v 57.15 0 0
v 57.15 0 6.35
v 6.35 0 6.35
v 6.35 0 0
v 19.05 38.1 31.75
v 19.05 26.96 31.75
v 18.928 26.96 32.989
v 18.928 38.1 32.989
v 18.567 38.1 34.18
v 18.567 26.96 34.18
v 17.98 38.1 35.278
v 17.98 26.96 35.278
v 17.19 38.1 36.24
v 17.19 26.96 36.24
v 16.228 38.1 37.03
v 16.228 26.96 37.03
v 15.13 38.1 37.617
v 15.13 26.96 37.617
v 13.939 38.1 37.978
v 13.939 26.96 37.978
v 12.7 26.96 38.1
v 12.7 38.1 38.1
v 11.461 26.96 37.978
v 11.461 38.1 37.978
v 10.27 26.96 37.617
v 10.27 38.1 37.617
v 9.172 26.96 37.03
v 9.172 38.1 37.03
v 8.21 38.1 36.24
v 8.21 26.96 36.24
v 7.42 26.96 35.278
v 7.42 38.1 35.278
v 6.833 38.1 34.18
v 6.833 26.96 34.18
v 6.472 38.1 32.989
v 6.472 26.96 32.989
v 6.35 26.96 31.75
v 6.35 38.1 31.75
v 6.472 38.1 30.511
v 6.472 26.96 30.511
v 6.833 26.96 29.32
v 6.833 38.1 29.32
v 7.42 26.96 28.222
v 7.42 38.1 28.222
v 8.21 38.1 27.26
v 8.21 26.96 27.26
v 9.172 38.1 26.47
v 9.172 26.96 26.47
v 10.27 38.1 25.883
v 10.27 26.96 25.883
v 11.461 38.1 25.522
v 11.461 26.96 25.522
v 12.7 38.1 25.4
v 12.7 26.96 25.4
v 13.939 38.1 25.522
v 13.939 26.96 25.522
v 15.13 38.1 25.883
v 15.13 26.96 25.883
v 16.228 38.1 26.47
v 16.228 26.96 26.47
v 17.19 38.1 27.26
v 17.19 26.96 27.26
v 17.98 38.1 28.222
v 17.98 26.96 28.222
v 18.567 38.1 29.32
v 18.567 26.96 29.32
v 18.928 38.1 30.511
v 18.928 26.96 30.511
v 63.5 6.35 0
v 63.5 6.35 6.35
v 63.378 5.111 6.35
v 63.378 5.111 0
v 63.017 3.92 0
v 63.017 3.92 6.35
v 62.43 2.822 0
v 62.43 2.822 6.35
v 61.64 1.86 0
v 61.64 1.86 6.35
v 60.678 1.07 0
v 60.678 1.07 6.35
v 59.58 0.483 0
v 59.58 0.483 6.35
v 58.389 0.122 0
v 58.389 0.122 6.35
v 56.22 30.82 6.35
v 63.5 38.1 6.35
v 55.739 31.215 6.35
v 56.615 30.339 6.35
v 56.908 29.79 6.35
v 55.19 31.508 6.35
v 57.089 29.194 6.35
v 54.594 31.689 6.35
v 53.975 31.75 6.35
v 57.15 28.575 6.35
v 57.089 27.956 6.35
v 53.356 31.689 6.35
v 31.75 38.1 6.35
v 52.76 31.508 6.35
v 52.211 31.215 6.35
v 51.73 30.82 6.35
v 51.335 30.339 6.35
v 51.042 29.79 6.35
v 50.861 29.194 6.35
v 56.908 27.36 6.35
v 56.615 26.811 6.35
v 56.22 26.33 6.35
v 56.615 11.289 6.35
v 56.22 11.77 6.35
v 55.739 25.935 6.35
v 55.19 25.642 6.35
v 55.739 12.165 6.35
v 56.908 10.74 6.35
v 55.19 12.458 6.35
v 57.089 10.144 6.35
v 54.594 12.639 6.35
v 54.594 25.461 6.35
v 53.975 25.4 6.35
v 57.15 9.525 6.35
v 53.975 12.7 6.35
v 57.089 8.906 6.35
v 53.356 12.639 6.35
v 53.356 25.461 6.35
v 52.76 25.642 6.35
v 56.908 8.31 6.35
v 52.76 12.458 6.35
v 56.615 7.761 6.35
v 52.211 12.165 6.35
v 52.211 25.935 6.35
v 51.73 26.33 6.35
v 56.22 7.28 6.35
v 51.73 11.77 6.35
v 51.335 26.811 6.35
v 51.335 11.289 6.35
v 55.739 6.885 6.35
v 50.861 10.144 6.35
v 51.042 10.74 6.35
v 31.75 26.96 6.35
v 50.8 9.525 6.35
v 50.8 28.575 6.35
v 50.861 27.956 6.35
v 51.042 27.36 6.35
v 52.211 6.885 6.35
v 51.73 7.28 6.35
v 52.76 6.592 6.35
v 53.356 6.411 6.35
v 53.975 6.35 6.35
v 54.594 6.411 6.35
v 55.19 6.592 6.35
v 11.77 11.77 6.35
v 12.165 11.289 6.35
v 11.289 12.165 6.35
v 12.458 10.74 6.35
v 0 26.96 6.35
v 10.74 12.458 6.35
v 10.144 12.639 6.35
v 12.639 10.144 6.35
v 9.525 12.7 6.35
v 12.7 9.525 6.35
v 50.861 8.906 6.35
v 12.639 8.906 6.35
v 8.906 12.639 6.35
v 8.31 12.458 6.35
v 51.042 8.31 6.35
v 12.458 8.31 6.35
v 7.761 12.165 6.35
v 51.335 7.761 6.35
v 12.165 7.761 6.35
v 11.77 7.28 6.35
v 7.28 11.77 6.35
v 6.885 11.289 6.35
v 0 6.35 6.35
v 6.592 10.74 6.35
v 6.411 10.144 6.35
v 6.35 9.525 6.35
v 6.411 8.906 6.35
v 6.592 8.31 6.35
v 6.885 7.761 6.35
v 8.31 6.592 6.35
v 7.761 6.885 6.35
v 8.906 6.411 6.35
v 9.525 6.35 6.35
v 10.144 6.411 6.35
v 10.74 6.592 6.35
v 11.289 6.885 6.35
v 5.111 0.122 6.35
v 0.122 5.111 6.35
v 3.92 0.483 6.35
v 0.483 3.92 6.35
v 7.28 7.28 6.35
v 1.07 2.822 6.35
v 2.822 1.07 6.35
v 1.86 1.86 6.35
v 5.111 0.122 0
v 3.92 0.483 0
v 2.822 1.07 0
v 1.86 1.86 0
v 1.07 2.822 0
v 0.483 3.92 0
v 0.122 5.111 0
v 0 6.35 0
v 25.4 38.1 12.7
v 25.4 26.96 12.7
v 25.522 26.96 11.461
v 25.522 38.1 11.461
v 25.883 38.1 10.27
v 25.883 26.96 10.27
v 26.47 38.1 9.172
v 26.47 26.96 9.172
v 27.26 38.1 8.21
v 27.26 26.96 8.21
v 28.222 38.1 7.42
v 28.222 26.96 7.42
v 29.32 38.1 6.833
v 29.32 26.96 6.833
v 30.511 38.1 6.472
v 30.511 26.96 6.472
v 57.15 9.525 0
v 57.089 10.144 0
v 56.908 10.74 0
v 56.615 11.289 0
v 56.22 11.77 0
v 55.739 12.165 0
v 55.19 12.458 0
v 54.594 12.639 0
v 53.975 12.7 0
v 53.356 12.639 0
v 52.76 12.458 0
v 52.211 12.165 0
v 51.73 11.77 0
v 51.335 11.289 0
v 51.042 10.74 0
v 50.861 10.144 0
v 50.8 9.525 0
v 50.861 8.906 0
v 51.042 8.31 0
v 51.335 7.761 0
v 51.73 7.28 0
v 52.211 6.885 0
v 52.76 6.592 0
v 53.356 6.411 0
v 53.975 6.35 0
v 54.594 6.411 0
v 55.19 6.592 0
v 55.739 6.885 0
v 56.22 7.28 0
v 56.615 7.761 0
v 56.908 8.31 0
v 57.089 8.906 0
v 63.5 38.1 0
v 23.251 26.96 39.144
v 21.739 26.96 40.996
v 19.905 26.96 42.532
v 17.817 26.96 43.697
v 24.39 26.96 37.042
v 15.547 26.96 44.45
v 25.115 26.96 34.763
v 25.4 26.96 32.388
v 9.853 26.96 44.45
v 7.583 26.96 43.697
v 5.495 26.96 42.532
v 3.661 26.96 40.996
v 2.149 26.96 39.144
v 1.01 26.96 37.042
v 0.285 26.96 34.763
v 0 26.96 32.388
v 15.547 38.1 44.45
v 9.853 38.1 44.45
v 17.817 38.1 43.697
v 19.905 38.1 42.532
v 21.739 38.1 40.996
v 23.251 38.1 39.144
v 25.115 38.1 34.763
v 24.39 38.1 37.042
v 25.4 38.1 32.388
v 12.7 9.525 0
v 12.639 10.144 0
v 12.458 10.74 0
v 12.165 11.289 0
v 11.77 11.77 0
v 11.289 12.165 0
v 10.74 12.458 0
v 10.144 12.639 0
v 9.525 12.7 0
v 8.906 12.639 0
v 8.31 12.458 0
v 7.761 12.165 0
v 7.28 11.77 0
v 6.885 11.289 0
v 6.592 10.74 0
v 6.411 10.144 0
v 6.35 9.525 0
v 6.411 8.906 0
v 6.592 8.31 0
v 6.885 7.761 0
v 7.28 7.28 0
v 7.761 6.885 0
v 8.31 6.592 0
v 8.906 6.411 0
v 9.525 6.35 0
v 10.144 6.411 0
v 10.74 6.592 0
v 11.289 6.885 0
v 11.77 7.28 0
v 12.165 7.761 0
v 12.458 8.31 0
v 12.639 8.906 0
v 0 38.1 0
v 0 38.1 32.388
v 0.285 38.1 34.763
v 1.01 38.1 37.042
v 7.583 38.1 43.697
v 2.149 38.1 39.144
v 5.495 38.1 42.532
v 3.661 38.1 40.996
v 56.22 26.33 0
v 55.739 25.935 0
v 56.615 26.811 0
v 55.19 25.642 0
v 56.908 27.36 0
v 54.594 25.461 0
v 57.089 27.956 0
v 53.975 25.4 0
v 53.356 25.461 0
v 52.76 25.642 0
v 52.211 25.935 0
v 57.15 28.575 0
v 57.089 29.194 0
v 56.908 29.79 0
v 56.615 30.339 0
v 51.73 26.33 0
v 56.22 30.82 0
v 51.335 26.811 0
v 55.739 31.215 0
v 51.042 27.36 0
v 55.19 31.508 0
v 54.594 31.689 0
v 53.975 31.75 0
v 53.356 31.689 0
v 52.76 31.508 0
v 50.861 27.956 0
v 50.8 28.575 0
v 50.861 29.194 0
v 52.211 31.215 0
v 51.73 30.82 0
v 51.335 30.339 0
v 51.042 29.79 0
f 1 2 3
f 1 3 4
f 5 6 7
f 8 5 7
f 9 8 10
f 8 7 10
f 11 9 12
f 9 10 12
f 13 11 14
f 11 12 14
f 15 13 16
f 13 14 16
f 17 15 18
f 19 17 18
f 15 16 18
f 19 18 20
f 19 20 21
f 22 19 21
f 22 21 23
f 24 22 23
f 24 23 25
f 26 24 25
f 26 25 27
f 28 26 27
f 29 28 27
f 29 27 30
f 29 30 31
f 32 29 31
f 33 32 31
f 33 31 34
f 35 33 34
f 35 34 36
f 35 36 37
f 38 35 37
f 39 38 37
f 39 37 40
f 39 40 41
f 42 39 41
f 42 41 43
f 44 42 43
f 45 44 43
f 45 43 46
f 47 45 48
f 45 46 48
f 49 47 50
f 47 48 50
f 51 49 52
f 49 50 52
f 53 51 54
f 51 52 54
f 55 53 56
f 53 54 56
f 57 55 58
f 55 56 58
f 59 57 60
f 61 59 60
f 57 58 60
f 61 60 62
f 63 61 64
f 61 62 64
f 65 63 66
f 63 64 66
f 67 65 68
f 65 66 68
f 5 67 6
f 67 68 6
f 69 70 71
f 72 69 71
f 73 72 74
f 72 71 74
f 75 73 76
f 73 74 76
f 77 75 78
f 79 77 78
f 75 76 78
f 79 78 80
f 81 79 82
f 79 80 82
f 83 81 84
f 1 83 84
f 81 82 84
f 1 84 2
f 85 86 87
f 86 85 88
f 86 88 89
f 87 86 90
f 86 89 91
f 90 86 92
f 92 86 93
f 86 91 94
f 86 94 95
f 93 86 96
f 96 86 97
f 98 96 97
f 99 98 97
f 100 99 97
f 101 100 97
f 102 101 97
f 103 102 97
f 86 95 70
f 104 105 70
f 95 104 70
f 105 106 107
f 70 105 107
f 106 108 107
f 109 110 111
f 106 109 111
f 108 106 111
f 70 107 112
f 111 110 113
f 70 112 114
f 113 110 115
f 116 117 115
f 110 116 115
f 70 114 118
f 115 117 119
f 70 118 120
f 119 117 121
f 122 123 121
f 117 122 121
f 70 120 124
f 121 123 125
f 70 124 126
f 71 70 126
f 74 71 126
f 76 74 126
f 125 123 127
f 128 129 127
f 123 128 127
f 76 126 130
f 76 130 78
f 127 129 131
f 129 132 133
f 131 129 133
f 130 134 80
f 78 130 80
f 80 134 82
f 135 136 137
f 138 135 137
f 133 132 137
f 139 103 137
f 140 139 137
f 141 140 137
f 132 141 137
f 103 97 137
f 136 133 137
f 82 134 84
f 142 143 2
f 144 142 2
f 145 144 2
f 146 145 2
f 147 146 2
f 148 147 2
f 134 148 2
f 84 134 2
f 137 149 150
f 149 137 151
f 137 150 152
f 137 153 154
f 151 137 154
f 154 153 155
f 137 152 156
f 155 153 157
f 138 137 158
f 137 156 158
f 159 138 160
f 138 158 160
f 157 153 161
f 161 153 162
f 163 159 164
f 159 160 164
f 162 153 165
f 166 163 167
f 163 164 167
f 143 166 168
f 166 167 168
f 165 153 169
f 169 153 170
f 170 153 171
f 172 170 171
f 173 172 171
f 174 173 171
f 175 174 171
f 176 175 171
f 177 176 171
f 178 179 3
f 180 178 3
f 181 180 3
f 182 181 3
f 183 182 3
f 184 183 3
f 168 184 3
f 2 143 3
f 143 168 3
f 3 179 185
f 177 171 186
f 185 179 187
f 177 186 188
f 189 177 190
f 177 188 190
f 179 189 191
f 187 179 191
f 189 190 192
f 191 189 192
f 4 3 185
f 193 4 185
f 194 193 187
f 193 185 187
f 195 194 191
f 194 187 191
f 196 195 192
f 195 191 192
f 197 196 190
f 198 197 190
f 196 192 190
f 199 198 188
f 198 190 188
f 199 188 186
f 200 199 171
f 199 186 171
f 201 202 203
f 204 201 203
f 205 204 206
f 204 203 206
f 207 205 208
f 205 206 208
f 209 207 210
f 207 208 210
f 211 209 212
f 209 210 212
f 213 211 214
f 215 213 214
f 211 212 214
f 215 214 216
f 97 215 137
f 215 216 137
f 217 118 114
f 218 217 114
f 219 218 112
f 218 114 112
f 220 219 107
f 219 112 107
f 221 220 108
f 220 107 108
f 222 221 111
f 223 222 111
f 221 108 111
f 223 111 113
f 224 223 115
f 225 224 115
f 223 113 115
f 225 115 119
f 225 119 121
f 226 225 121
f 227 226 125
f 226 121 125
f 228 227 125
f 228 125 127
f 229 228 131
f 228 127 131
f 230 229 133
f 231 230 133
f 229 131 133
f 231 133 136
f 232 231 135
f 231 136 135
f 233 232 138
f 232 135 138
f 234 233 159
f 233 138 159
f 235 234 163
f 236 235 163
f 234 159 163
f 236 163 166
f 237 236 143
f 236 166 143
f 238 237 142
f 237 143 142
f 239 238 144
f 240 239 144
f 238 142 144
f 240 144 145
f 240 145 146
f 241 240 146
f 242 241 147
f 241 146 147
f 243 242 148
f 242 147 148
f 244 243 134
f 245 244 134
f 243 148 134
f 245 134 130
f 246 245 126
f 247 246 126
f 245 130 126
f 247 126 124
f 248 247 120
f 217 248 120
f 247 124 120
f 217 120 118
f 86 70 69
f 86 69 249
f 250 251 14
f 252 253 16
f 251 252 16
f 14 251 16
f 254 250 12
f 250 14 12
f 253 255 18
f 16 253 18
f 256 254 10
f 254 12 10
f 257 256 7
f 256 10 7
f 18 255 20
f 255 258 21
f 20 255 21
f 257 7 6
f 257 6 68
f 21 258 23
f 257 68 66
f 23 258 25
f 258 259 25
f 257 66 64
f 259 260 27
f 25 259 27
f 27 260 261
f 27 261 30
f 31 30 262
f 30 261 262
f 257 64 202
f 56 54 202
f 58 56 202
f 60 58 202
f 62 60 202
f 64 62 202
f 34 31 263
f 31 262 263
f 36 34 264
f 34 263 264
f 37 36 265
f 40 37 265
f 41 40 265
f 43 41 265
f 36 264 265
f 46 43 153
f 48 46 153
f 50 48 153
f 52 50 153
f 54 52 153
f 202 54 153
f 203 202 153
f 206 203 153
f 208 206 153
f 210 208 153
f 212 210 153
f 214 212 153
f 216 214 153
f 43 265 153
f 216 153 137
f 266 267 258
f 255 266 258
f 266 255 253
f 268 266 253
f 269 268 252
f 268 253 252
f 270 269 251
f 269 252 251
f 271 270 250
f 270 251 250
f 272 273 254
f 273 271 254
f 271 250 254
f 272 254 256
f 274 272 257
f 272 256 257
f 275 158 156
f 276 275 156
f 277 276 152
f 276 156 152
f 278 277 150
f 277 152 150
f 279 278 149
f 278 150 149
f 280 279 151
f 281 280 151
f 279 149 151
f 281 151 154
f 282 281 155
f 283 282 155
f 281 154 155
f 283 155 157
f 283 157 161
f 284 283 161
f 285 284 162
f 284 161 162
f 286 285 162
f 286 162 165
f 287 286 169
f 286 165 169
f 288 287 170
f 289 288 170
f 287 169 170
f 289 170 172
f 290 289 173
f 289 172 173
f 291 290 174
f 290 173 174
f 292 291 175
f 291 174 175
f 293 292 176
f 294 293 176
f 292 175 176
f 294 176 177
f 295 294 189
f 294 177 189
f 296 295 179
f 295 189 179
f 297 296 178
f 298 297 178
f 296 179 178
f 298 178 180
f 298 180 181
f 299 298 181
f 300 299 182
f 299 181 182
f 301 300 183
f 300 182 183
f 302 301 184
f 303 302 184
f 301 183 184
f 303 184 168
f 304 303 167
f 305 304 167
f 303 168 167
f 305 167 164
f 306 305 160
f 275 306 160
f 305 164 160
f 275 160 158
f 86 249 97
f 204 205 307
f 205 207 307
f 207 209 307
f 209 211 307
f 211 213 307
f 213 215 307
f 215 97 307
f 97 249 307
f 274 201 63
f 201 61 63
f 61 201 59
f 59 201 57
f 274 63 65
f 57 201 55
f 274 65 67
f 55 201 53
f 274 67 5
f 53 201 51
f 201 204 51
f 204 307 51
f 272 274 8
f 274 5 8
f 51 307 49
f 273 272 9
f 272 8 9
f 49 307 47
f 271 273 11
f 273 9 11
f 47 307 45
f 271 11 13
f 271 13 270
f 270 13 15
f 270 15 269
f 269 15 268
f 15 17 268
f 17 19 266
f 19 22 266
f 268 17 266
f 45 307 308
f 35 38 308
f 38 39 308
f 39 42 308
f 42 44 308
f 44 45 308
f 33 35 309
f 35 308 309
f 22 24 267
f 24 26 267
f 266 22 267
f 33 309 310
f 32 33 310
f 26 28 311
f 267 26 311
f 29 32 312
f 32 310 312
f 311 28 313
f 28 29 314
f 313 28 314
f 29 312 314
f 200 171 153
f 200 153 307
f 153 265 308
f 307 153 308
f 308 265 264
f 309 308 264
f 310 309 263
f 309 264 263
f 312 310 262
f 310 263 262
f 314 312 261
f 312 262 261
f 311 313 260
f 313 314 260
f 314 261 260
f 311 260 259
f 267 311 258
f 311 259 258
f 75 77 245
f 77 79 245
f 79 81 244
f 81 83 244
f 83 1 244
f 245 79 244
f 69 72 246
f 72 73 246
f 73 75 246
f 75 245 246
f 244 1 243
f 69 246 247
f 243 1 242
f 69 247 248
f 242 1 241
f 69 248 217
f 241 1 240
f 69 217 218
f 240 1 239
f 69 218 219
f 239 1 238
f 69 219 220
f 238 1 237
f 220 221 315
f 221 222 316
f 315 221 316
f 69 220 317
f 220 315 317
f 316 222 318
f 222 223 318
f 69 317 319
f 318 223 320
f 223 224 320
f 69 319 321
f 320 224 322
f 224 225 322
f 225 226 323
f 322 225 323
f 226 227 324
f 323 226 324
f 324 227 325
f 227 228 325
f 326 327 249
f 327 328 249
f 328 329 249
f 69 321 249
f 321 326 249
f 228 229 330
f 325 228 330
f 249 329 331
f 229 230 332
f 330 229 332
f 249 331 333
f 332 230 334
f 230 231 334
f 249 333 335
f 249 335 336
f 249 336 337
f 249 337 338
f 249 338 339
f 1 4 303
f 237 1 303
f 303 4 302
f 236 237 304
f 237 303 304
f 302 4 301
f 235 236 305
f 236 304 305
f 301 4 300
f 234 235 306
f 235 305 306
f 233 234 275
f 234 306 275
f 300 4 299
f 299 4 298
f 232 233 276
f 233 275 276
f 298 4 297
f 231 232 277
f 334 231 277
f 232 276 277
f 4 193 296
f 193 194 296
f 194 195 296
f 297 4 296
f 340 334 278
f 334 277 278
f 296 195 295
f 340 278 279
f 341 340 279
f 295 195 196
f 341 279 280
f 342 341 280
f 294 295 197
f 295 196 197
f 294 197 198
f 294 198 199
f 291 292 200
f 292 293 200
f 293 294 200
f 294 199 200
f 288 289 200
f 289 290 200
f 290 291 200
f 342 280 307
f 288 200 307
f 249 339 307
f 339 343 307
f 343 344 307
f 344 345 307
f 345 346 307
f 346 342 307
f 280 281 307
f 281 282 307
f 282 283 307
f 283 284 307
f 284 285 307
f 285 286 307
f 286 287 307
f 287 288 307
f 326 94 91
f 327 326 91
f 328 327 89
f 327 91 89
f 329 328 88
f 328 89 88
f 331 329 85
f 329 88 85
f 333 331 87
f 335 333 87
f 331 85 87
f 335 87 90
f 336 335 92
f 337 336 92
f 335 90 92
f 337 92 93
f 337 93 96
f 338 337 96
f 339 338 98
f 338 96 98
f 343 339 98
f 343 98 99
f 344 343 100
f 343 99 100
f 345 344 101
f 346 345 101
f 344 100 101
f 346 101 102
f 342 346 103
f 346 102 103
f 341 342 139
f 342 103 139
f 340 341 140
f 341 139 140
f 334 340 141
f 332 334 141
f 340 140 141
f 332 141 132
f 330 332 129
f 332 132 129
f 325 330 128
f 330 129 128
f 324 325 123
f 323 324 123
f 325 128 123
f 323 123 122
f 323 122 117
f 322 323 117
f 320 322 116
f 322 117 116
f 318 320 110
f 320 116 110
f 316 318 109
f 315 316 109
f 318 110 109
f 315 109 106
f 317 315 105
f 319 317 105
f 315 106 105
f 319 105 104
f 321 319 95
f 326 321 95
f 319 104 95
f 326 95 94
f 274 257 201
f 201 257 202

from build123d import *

# Parameters (mm, degrees)
F1_DEPTH = 63.5
F3_DEPTH = 12.7
F4_R     = 6.35
F5_DEPTH = 12.7
F6_R     = 3.175
F7_DEPTH = 6.35


with BuildPart() as f1:
    # F0 (on Right) → F1 (new body)
    with BuildSketch(Plane.YZ):
        Polygon((0, 6.35), (0, 0), (38.1, 0), (38.1, 44.45), (26.9596510282, 44.45), (26.9596510282, 6.35), align=None)
    extrude(amount=F1_DEPTH)

    # F2 (on face) → F3 (cut)
    with BuildSketch(Plane.XZ.offset(-26.9596510282)):
        with BuildLine():
            Line((63.5, 44.45), (25.4, 44.45))
            Line((25.4, 44.45), (25.4, 12.7))
            ThreePointArc((25.4, 12.7), (27.2598719395, 8.2098719395), (31.75, 6.35))
            Line((31.75, 6.35), (63.5, 6.35))
            Line((63.5, 6.35), (63.5, 44.45))
        make_face()
    extrude(amount=-F3_DEPTH, mode=Mode.SUBTRACT)

    # F4 (on face) → F5 (cut)
    with BuildSketch(Plane.XZ.offset(-26.9596510282)):
        with BuildLine():
            ThreePointArc((15.5470193775, 44.45), (22.5386496815, 40.1060799579), (25.4, 32.3882298689))
            Line((25.4, 32.3882298689), (25.4, 44.45))
            Line((25.4, 44.45), (15.5470193775, 44.45))
        make_face()
        with Locations((12.7, 31.75)):
            Circle(F4_R)
        with BuildLine():
            ThreePointArc((0, 32.3882298689), (2.8613503185, 40.1060799579), (9.8529806225, 44.45))
            Line((9.8529806225, 44.45), (0, 44.45))
            Line((0, 44.45), (0, 32.3882298689))
        make_face()
    extrude(amount=-F5_DEPTH, mode=Mode.SUBTRACT)

    # F6 (on face) → F7 (cut)
    with BuildSketch(Plane.XY.offset(6.35)):
        with Locations((53.975, 9.525)):
            Circle(F6_R)
        with BuildLine():
            ThreePointArc((63.5, 6.35), (61.6401280605, 1.8598719395), (57.15, 0))
            Line((57.15, 0), (63.5, 0))
            Line((63.5, 0), (63.5, 6.35))
        make_face()
        with BuildLine():
            ThreePointArc((6.35, 0), (1.8598719395, 1.8598719395), (0, 6.35))
            Line((0, 6.35), (0, 0))
            Line((0, 0), (6.35, 0))
        make_face()
        with Locations((9.525, 9.525)):
            Circle(F6_R)
        with Locations((53.975, 28.575005229)):
            Circle(F6_R)
    extrude(amount=-F7_DEPTH, mode=Mode.SUBTRACT)


solid = f1.part
